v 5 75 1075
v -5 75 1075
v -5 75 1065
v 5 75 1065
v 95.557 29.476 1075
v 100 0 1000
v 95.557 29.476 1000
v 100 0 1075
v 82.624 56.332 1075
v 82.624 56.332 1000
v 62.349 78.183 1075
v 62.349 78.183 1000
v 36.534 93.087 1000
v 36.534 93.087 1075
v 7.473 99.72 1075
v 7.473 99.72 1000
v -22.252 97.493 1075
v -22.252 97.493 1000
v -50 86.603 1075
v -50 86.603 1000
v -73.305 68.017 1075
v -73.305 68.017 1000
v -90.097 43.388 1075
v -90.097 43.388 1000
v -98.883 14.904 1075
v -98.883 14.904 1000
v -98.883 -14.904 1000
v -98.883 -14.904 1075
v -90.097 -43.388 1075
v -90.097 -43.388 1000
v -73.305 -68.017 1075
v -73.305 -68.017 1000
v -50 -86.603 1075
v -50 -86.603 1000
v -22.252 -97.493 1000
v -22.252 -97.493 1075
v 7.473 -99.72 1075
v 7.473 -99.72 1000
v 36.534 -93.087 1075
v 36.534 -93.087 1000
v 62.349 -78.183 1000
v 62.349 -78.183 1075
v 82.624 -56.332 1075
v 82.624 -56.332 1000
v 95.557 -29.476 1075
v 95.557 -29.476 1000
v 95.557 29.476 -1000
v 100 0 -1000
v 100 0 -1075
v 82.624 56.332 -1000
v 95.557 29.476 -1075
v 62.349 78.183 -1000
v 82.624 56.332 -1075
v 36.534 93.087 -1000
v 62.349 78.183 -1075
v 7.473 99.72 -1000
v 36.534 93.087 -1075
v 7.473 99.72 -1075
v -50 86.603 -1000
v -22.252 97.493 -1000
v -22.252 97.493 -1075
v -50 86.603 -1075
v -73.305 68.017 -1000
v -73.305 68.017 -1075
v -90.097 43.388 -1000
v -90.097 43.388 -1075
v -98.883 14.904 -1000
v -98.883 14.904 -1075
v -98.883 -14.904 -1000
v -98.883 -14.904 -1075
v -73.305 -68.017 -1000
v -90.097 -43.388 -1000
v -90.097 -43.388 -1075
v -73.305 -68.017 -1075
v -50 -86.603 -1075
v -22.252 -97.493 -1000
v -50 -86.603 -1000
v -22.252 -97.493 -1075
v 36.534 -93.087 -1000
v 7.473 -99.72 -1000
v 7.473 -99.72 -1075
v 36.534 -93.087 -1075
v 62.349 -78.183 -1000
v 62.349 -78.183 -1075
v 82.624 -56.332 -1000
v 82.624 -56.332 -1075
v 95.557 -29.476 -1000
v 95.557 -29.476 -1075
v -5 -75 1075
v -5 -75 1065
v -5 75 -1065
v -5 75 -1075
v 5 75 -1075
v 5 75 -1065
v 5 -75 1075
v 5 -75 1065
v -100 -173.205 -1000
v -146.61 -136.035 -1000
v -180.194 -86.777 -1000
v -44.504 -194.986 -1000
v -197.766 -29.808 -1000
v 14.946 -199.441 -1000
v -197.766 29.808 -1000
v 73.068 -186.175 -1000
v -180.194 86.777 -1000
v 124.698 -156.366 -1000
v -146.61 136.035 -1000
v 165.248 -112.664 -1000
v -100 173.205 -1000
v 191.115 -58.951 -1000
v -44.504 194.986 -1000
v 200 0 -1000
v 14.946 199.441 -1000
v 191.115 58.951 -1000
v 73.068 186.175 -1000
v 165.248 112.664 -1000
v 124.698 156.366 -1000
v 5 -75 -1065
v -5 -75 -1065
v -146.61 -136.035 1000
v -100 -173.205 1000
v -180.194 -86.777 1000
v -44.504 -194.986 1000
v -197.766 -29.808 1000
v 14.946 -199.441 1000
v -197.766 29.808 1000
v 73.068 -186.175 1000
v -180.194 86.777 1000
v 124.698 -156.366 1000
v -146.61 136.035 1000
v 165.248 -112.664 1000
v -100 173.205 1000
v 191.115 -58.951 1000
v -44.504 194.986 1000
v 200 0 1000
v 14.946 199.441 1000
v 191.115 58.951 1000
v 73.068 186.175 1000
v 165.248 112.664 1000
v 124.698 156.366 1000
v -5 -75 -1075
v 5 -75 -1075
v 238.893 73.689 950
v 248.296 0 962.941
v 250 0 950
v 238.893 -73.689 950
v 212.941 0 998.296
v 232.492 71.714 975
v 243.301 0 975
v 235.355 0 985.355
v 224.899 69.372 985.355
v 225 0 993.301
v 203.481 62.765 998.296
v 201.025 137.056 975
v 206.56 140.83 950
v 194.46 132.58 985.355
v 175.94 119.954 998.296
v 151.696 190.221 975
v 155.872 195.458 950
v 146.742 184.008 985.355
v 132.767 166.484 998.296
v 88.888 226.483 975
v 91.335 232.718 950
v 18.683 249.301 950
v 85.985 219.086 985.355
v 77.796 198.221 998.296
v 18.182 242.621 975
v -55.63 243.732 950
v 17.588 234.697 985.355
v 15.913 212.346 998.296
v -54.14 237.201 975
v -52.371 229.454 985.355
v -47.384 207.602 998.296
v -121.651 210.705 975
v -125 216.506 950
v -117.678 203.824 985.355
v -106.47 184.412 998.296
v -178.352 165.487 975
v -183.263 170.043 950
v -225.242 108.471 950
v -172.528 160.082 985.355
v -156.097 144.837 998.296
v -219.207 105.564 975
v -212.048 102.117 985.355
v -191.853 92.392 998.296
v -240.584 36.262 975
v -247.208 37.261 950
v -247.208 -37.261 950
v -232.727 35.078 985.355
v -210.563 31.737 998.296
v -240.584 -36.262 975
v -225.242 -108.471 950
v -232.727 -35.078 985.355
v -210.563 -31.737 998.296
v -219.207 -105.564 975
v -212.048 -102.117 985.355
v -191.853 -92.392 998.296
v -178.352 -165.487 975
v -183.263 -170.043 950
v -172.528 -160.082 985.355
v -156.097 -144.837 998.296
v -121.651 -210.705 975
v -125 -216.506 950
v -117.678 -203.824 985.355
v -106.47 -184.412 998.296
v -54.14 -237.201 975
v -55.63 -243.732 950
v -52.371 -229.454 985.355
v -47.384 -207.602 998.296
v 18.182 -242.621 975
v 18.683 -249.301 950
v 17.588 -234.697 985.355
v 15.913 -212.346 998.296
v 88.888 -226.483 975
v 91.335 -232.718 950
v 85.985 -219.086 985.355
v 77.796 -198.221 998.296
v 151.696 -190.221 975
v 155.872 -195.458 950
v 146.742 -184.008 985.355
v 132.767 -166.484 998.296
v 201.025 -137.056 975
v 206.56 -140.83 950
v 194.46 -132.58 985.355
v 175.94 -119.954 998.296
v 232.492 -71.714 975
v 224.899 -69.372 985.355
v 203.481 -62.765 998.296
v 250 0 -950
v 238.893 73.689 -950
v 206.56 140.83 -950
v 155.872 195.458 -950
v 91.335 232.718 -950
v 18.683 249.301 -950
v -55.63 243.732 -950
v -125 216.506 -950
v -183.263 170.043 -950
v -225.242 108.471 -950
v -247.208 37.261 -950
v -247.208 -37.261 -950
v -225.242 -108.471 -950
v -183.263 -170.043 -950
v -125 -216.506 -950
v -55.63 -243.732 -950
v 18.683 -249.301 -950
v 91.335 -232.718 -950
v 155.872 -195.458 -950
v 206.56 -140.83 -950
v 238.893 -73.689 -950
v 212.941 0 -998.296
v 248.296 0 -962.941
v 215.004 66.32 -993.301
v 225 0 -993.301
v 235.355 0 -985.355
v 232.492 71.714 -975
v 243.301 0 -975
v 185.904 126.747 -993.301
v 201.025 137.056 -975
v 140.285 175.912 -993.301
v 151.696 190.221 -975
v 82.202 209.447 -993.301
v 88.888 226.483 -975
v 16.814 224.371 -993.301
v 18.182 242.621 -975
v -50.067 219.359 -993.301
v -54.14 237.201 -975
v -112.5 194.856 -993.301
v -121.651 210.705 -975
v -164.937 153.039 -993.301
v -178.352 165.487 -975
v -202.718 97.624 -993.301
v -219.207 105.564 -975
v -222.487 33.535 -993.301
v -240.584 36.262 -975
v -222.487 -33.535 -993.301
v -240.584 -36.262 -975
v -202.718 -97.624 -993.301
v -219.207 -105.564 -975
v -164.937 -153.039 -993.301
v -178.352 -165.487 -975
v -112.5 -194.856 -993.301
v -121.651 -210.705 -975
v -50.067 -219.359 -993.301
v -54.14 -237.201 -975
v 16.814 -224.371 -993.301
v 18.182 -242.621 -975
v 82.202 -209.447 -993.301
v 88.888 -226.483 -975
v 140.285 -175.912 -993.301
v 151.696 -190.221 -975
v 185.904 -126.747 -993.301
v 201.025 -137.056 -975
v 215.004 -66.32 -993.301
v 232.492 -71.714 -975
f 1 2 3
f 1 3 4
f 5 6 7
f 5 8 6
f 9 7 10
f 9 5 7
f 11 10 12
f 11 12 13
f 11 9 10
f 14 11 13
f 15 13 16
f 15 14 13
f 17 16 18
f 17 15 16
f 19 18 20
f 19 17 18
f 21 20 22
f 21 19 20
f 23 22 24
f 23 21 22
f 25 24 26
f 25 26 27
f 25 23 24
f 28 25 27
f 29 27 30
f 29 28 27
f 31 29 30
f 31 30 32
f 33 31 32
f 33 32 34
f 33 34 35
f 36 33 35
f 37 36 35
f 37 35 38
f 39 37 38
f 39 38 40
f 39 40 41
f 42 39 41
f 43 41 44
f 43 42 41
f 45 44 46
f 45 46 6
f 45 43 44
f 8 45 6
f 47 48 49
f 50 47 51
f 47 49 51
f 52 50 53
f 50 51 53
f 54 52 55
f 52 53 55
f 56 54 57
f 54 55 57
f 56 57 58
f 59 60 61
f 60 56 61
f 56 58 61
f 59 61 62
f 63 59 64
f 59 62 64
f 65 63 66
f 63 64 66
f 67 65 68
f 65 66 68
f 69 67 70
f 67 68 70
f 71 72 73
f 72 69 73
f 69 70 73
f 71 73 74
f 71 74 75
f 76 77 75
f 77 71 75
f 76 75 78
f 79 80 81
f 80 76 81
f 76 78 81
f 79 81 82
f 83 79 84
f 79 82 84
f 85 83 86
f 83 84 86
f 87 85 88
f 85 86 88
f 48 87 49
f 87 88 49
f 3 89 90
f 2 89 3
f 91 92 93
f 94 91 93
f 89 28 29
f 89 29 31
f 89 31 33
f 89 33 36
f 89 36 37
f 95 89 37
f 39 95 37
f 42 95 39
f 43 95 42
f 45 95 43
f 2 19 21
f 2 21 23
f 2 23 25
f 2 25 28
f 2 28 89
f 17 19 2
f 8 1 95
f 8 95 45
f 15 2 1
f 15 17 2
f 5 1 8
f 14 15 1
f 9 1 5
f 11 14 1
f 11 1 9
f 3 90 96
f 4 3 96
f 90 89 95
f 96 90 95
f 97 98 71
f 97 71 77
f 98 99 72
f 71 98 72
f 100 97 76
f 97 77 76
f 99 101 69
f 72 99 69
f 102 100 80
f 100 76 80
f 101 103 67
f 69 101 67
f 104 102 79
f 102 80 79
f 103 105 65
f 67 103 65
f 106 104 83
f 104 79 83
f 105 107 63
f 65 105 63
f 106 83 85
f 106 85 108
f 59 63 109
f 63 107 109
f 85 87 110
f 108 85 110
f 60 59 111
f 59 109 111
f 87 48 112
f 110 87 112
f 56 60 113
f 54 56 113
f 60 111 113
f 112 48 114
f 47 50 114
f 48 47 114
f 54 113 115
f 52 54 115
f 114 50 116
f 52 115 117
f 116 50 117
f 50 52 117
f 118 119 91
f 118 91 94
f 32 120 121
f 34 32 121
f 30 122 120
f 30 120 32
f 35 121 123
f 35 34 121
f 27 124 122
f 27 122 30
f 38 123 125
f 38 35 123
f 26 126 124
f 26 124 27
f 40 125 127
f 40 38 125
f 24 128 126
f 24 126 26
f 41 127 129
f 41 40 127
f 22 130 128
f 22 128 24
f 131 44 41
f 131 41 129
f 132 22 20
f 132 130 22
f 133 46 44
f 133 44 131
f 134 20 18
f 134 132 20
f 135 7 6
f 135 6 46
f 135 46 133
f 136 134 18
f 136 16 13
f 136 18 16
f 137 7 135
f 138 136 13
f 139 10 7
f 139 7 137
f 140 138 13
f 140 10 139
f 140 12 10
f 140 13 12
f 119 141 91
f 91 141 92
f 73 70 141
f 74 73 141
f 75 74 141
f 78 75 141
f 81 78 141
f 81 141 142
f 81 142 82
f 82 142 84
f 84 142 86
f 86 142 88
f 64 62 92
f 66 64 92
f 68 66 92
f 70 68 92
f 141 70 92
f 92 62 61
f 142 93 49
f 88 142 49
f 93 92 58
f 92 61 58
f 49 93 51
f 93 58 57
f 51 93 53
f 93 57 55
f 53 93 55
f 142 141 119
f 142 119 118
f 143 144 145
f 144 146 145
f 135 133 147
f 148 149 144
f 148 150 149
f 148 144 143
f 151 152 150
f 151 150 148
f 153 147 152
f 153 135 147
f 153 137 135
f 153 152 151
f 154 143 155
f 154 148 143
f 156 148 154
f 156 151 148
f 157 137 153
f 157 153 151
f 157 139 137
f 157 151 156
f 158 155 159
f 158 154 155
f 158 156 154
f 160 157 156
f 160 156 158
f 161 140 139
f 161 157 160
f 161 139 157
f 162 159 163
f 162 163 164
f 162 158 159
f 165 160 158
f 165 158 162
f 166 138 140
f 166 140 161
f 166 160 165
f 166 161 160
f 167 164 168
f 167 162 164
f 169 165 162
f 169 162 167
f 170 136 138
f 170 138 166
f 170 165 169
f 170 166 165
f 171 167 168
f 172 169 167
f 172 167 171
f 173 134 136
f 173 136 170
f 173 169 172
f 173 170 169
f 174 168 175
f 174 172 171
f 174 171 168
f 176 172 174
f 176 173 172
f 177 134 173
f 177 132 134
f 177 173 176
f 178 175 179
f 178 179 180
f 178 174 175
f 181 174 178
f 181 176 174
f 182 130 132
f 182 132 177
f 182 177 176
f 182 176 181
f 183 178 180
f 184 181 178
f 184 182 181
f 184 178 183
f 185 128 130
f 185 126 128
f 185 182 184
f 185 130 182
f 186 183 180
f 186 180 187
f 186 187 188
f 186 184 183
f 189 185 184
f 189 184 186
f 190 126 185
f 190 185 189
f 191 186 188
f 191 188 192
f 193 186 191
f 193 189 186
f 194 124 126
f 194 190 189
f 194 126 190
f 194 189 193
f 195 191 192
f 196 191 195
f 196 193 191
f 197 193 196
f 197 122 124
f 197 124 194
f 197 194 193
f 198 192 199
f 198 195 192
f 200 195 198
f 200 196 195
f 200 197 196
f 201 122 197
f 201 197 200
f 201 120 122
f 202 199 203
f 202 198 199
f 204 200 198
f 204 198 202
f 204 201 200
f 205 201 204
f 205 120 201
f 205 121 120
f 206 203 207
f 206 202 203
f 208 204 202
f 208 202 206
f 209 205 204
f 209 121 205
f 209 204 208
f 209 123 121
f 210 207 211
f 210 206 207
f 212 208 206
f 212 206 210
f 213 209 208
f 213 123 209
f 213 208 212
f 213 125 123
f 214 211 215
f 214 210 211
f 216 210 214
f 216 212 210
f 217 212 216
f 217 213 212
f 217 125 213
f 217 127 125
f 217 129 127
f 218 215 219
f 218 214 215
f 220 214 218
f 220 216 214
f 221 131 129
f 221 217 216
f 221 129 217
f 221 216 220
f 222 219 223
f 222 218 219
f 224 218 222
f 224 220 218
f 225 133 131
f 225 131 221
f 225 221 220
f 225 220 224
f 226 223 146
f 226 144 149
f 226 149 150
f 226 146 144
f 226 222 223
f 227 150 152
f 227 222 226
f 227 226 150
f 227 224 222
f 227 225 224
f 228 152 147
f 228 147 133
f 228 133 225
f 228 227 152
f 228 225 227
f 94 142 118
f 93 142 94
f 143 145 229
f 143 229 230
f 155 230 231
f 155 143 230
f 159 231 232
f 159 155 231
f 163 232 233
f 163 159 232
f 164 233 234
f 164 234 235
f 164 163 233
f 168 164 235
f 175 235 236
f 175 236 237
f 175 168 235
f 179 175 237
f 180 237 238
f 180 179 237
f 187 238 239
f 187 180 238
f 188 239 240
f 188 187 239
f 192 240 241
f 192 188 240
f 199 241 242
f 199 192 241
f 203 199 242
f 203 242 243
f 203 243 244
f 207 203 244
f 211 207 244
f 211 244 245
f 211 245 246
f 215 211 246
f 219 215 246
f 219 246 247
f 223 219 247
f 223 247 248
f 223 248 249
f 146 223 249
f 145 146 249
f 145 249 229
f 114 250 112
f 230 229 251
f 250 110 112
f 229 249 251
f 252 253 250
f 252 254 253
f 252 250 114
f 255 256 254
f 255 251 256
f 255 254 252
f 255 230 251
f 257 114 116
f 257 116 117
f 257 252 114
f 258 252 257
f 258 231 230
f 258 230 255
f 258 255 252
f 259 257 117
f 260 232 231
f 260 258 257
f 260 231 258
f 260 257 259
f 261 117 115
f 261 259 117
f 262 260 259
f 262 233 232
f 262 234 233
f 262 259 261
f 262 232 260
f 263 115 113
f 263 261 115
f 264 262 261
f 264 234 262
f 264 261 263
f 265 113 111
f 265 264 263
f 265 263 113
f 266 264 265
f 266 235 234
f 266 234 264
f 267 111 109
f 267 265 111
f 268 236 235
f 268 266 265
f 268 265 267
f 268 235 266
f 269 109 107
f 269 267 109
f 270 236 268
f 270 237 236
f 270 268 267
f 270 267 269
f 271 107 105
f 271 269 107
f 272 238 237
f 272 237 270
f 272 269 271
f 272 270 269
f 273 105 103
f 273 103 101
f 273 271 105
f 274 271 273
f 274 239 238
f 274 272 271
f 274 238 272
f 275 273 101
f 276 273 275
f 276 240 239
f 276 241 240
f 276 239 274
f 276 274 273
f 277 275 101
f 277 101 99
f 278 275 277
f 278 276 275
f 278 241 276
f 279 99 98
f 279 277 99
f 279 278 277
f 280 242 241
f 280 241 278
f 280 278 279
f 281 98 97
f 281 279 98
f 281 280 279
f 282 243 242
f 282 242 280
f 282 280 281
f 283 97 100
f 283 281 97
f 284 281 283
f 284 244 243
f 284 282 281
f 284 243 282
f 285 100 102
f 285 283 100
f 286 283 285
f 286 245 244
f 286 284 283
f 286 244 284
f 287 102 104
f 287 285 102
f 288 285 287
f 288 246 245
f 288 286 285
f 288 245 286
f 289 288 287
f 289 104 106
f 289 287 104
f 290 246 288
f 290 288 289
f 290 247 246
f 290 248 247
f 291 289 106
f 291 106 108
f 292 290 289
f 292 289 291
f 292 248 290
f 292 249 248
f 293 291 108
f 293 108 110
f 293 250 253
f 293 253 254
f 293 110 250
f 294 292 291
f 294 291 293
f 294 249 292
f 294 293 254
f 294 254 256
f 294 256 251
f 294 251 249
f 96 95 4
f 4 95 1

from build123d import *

# Parameters (mm, degrees)
SKETCH1_R           = 250
BOSS_EXTRUDE4_DEPTH = 1000
SKETCH6_R           = 100
BOSS_EXTRUDE5_DEPTH = 75
SKETCH8_W           = 10
SKETCH8_H           = 150
CUT_EXTRUDE7_DEPTH  = 10
FILLET1_R           = 50


with BuildPart() as part:
    # Sketch1 → Boss-Extrude4 (new, symmetric)
    with BuildSketch(Plane.XY):
        Circle(SKETCH1_R)
    extrude(amount=BOSS_EXTRUDE4_DEPTH, both=True)

    # Sketch6 → Boss-Extrude5 (add, symmetric)
    with BuildSketch(Plane.XY.offset(1000)):
        Circle(SKETCH6_R)
    boss_extrude5 = extrude(amount=BOSS_EXTRUDE5_DEPTH, both=True)

    # Sketch8 → Cut-Extrude7 (cut)
    with BuildSketch(Plane.XY.offset(1075)):
        Rectangle(SKETCH8_W, SKETCH8_H)
    cut_extrude7 = extrude(amount=-CUT_EXTRUDE7_DEPTH, mode=Mode.SUBTRACT)

    # Mirror3: Boss-Extrude5, Cut-Extrude7 across plane
    add(boss_extrude5.mirror(Plane.XY))
    add(cut_extrude7.mirror(Plane.XY), mode=Mode.SUBTRACT)

    # Fillet1
    fillet1_edges = [part.edges().sort_by_distance(p)[0] for p in [
        (-250, 0, -1000),
        (-250, 0, 1000),
    ]]
    fillet(fillet1_edges, radius=FILLET1_R)


solid = part.part
